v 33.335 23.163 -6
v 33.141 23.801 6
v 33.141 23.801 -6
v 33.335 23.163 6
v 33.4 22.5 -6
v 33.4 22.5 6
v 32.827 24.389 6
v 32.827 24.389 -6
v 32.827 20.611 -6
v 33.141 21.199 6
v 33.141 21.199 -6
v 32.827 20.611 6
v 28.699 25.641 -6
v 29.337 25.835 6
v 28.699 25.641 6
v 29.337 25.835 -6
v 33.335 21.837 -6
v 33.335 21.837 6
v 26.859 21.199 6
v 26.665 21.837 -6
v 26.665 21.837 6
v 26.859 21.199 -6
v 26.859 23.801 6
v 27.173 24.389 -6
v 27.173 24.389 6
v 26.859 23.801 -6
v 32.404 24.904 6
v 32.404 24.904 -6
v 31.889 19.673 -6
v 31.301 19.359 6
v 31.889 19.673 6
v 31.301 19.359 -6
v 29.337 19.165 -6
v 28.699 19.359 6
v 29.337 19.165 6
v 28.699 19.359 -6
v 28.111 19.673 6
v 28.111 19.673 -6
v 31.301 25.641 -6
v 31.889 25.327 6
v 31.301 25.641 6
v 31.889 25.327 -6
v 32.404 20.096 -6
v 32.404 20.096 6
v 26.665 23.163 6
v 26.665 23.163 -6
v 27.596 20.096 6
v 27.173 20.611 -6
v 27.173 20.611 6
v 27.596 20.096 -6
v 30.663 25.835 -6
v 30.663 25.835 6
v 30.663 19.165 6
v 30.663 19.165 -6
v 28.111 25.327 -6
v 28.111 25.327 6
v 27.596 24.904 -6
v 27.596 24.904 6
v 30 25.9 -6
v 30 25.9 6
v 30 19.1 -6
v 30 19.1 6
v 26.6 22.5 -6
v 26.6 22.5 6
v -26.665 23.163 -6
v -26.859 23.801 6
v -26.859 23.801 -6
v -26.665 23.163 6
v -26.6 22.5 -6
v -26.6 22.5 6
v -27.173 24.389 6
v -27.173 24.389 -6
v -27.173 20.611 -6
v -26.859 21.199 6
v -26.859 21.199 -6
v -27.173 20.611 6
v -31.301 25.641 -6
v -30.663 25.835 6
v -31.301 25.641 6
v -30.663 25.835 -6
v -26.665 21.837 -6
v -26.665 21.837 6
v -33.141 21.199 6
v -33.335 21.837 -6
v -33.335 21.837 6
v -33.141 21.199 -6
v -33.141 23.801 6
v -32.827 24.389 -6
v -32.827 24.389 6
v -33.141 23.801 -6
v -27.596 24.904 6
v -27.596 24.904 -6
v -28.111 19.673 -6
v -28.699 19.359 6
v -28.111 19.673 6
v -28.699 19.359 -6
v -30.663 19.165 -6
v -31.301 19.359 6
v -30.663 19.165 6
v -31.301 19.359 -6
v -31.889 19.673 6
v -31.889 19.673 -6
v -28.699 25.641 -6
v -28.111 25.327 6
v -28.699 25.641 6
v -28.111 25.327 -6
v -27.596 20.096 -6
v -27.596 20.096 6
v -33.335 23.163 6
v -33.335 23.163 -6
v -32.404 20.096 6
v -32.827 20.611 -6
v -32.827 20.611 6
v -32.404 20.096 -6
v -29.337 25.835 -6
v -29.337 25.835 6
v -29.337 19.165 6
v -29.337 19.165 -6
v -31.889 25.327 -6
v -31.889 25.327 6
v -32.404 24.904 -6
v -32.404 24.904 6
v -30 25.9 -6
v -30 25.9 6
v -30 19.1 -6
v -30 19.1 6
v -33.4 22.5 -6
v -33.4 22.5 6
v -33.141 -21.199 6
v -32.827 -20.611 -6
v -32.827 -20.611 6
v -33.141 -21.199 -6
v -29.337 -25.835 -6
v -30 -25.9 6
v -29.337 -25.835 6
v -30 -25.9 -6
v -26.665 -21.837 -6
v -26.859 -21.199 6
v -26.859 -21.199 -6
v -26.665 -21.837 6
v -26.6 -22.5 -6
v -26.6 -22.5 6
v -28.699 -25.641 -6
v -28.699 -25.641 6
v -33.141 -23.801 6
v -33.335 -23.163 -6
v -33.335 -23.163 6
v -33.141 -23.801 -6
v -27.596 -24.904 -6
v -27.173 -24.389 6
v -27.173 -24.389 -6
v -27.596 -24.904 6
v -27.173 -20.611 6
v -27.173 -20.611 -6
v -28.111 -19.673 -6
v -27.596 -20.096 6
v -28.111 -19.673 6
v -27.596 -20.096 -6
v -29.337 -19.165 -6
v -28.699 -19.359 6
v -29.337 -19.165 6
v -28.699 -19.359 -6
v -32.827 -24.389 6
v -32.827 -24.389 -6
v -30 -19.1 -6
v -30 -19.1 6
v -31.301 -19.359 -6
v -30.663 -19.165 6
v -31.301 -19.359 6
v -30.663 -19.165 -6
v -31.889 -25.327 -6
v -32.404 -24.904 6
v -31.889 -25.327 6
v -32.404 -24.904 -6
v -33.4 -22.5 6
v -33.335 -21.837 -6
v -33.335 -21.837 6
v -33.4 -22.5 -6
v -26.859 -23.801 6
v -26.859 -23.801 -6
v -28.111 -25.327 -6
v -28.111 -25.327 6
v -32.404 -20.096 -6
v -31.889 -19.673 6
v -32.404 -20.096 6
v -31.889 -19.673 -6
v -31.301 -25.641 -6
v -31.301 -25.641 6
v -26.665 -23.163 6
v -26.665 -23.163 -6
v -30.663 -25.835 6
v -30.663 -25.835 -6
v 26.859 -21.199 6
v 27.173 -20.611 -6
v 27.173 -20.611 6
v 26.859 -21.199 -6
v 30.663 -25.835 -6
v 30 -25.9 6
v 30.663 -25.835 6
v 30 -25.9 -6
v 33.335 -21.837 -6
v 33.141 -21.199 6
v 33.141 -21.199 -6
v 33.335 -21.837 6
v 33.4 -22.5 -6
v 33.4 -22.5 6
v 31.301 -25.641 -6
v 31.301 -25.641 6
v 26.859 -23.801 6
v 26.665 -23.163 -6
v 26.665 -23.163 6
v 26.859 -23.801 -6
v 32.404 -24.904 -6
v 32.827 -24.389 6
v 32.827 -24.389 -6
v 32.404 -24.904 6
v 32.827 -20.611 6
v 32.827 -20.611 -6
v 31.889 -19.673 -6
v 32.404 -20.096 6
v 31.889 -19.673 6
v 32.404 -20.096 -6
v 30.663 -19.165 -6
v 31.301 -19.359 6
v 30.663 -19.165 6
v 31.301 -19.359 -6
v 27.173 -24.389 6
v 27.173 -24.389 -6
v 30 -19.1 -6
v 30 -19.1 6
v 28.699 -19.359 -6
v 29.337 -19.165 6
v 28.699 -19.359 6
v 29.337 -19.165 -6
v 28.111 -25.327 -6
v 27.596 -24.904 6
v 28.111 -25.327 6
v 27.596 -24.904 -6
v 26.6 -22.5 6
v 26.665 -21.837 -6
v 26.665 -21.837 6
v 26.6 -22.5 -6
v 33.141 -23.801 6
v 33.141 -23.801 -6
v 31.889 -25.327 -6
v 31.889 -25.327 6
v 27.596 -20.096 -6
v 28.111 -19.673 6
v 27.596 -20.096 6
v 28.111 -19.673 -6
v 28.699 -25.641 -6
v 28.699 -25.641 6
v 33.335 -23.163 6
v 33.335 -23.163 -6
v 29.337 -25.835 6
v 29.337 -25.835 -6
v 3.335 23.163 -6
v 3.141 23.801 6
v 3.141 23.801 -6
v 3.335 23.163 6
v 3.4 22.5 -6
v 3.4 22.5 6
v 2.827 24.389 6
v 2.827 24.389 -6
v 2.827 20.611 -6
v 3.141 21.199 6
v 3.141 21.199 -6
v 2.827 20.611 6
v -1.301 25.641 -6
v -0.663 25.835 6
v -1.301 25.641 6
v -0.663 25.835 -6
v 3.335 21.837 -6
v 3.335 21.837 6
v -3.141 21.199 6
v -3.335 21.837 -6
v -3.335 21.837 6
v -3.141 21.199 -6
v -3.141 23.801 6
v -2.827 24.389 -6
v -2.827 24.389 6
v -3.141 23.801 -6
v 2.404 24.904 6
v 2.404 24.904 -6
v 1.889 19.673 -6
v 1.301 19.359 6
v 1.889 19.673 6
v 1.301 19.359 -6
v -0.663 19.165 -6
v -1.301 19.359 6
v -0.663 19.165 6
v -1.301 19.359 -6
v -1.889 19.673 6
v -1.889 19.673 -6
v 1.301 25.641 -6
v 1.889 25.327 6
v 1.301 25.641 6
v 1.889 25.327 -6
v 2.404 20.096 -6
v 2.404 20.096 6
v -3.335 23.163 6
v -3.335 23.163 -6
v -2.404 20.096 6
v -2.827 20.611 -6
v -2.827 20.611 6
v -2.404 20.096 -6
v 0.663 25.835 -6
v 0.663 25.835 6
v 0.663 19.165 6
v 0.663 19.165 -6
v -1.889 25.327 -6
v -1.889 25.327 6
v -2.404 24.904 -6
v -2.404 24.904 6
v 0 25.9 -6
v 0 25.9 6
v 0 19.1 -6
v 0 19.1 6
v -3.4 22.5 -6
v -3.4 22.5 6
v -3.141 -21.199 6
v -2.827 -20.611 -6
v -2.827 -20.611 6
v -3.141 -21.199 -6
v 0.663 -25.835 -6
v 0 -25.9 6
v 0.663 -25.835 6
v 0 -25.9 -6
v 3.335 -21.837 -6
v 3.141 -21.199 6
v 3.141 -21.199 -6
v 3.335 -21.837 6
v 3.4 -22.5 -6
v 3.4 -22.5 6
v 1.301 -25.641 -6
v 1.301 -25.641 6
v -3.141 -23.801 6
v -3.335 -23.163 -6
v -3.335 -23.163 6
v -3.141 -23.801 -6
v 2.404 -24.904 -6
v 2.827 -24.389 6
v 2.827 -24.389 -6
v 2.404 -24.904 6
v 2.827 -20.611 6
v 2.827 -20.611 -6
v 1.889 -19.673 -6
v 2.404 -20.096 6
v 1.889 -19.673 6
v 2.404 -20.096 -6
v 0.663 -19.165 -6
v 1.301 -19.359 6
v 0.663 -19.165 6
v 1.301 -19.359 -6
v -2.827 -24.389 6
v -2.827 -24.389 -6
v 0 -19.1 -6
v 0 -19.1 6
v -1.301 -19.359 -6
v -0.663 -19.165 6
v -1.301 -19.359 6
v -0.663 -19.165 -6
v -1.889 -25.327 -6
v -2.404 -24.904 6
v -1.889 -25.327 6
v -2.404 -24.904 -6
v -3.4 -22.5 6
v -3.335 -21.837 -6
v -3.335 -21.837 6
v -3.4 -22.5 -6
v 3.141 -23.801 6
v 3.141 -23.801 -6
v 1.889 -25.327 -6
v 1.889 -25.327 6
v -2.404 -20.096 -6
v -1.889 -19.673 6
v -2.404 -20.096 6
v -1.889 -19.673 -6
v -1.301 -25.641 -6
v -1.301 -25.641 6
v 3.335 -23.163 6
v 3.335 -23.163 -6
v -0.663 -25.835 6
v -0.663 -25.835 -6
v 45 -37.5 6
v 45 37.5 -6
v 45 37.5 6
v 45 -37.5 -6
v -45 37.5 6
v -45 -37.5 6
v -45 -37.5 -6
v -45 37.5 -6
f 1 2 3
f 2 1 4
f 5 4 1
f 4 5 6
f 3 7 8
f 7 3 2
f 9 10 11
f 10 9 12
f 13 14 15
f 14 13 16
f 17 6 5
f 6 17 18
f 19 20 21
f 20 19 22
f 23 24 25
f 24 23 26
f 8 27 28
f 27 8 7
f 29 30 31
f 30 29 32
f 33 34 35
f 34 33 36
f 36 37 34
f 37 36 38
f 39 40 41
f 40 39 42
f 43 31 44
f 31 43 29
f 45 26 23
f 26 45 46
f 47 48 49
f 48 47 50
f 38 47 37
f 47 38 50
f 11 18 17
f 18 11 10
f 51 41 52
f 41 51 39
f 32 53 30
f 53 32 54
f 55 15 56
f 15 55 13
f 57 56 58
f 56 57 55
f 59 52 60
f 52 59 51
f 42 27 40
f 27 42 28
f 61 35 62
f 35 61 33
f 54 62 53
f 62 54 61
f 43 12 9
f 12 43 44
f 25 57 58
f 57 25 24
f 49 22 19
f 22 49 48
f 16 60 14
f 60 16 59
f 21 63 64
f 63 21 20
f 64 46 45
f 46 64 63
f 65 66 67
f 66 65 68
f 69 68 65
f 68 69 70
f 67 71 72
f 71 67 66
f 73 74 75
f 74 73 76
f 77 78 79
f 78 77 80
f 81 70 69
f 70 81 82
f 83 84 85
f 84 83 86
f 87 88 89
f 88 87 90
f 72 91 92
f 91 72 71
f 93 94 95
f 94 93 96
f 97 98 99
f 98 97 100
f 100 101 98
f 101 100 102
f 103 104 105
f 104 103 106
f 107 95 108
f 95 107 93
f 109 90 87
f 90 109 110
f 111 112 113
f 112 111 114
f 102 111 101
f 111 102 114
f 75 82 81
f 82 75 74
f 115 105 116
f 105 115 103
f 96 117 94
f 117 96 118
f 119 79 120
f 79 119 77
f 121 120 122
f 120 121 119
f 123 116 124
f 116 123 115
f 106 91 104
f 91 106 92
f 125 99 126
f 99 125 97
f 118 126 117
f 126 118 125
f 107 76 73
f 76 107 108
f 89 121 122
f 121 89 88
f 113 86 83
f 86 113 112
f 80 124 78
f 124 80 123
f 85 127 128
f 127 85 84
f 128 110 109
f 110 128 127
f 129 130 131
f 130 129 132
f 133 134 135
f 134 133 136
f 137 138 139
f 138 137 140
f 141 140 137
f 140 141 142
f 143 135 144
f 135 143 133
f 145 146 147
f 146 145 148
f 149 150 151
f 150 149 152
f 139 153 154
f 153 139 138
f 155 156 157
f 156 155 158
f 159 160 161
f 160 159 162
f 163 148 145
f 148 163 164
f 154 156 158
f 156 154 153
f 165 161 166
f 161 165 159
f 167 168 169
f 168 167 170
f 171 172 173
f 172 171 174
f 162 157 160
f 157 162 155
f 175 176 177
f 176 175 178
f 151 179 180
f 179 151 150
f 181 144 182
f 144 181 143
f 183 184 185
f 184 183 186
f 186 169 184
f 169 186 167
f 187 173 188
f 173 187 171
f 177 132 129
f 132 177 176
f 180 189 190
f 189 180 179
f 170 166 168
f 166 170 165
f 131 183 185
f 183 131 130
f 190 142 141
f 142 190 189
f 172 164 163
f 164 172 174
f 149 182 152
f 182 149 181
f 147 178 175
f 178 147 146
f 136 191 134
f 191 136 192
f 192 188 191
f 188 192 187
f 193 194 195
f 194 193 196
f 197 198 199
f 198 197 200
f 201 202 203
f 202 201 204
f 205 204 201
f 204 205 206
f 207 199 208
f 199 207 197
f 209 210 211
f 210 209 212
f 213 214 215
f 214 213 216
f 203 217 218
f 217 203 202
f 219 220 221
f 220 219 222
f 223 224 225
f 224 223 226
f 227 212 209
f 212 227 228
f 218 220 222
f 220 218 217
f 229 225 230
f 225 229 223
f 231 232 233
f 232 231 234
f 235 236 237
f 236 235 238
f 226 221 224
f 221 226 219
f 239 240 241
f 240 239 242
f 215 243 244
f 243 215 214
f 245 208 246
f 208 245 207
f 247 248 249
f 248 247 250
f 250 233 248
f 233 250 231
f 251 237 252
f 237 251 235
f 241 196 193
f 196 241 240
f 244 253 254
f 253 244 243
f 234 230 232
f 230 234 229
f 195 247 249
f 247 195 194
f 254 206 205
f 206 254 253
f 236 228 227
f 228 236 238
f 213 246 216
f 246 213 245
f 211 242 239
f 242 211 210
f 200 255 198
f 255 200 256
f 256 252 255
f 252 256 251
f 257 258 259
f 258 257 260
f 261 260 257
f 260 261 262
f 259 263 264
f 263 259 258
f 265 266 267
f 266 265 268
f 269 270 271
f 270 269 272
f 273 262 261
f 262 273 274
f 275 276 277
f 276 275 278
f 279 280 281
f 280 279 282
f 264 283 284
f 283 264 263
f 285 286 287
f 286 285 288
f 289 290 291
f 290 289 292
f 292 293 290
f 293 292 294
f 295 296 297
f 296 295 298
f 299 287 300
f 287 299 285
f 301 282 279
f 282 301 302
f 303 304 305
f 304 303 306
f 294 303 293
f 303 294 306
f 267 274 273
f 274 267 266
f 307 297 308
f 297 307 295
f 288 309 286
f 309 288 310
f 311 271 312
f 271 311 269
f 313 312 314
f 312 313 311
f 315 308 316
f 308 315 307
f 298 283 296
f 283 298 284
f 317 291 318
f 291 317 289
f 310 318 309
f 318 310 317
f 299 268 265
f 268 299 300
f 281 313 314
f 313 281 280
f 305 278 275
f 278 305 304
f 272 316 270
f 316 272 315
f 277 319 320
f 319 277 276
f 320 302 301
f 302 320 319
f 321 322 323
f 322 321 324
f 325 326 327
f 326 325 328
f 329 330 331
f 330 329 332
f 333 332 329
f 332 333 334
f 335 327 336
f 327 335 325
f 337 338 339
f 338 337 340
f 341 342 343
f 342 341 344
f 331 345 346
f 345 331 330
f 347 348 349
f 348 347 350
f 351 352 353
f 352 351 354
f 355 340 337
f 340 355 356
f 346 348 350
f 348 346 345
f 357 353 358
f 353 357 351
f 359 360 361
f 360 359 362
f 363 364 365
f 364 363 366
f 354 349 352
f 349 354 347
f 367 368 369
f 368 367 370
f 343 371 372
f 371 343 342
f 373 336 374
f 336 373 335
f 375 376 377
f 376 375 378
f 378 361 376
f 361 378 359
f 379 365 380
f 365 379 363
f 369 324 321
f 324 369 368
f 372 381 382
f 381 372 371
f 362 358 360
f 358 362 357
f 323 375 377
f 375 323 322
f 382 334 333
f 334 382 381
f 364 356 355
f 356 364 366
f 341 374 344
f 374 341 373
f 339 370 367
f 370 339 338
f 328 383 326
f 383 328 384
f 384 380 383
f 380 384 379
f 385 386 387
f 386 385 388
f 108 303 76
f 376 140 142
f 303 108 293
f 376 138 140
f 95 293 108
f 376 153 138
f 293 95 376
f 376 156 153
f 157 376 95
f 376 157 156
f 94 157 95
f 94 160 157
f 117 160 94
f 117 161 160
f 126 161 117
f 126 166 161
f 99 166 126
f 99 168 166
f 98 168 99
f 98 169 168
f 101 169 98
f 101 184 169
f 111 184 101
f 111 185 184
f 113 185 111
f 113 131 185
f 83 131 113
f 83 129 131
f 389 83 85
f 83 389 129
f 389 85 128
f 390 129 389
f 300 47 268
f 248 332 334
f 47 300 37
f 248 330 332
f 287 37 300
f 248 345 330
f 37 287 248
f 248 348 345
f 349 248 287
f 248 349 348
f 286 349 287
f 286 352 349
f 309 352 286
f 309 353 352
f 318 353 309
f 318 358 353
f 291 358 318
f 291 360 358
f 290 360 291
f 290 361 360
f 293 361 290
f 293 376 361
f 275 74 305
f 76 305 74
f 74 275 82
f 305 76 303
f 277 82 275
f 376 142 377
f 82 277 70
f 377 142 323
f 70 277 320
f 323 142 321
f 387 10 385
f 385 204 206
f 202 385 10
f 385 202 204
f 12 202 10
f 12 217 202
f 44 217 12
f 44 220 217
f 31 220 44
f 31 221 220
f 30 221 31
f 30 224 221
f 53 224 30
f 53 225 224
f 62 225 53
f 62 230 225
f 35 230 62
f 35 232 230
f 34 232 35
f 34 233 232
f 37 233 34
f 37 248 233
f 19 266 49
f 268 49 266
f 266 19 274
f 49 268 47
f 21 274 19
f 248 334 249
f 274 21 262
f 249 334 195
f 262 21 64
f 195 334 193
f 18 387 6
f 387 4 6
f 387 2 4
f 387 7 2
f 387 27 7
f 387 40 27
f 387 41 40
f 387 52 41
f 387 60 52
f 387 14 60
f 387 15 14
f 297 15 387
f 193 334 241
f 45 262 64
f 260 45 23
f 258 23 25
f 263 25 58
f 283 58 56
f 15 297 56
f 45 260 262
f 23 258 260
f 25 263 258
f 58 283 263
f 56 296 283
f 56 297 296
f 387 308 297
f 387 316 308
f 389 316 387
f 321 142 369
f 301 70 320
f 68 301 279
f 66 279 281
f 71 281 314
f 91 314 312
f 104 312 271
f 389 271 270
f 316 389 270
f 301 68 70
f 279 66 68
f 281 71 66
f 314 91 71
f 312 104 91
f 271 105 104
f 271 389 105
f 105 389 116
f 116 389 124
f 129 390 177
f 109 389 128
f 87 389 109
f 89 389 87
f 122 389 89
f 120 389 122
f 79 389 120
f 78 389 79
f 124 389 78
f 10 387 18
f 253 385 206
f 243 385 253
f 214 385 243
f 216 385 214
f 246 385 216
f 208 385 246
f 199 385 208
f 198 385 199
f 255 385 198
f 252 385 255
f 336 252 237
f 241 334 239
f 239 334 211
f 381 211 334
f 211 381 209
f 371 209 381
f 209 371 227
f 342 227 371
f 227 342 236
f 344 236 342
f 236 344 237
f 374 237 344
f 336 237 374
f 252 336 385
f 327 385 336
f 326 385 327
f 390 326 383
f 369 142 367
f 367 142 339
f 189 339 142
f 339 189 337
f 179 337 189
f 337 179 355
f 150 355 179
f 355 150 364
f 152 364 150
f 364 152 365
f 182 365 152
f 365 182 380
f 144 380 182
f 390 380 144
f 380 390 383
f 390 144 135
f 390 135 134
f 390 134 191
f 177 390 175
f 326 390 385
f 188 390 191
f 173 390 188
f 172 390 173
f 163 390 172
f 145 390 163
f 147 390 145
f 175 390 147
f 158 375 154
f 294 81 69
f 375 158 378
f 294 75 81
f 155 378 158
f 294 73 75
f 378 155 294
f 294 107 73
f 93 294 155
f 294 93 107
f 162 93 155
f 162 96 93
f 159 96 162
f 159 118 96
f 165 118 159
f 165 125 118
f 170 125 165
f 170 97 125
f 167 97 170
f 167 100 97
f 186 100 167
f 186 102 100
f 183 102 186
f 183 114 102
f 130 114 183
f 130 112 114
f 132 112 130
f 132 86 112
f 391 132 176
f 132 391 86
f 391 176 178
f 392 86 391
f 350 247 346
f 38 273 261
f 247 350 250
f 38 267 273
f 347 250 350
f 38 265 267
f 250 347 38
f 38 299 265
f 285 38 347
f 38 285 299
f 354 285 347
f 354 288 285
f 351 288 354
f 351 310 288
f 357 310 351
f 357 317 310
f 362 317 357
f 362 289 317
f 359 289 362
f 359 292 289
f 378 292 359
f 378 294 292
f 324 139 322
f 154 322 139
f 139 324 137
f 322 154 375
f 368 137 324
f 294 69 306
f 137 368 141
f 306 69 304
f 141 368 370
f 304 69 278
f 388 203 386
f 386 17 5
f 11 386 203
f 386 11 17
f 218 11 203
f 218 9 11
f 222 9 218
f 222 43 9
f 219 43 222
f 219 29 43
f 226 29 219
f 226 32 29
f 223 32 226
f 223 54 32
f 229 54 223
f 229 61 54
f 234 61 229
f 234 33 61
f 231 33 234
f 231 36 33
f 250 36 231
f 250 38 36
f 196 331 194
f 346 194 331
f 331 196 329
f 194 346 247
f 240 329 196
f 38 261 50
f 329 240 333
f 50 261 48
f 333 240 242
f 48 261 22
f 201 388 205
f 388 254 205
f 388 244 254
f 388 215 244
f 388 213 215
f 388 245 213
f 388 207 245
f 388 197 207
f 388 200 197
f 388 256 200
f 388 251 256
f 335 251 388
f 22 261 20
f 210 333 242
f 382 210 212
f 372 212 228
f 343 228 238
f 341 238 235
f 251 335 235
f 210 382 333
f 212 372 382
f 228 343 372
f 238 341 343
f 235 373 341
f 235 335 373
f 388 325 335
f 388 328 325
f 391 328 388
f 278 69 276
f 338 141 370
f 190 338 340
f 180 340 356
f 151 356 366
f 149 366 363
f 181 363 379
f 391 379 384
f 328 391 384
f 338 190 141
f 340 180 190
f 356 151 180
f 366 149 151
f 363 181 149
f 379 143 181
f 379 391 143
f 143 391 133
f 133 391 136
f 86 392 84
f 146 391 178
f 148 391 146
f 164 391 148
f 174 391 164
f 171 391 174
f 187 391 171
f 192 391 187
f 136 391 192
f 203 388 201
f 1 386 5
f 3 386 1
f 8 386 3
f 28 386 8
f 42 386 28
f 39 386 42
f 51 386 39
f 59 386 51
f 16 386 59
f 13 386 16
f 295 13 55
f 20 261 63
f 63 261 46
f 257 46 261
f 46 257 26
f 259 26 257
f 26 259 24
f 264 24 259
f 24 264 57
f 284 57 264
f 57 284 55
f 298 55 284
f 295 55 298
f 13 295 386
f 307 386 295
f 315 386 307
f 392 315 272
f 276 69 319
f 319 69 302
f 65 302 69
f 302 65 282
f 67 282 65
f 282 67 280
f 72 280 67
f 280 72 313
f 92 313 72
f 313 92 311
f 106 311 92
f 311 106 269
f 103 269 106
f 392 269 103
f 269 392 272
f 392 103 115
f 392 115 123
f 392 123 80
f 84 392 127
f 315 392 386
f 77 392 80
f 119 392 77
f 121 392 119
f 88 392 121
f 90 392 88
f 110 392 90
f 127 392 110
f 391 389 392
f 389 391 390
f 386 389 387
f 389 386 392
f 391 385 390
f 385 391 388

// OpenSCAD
$fn = 32;

// ----------------------------------------------------------------------
// Corner plate 90 x 75 x 12
// 6 holes, centres taken from the edge offset
// ----------------------------------------------------------------------

// --- parameters (mm) ---
plate = [90, 75, 12];   // overall size (x, y, z)
holes = 6;              // number of holes the drawing asks for
bore_d = 6.6;           // nominal hole diameter from the drawing
print_allowance = 0.2;  // clearance added for printing
edge = 15;              // hole centre offset from the plate edge

// --- derived feature positions (mm) ---
hole_d = bore_d + print_allowance;  // = 6.8   hole diameter as printed
corner_x = plate[0] / 2 - edge;     // = 30   corner hole X
corner_y = plate[1] / 2 - edge;     // = 22.5   corner hole Y
feature_centers = [
  [corner_x, corner_y],
  [-corner_x, corner_y],
  [-corner_x, -corner_y],
  [corner_x, -corner_y],
  [0, corner_y],
  [0, -corner_y]
];   // hole centres the loop below drills

// plate outline, every hole drilled through with the same cutters
difference() {
  cube(plate, center = true);
  for (centre = feature_centers)
    translate([centre[0], centre[1], 0])
      cylinder(d = hole_d, h = plate[2] + 2, center = true);
}
